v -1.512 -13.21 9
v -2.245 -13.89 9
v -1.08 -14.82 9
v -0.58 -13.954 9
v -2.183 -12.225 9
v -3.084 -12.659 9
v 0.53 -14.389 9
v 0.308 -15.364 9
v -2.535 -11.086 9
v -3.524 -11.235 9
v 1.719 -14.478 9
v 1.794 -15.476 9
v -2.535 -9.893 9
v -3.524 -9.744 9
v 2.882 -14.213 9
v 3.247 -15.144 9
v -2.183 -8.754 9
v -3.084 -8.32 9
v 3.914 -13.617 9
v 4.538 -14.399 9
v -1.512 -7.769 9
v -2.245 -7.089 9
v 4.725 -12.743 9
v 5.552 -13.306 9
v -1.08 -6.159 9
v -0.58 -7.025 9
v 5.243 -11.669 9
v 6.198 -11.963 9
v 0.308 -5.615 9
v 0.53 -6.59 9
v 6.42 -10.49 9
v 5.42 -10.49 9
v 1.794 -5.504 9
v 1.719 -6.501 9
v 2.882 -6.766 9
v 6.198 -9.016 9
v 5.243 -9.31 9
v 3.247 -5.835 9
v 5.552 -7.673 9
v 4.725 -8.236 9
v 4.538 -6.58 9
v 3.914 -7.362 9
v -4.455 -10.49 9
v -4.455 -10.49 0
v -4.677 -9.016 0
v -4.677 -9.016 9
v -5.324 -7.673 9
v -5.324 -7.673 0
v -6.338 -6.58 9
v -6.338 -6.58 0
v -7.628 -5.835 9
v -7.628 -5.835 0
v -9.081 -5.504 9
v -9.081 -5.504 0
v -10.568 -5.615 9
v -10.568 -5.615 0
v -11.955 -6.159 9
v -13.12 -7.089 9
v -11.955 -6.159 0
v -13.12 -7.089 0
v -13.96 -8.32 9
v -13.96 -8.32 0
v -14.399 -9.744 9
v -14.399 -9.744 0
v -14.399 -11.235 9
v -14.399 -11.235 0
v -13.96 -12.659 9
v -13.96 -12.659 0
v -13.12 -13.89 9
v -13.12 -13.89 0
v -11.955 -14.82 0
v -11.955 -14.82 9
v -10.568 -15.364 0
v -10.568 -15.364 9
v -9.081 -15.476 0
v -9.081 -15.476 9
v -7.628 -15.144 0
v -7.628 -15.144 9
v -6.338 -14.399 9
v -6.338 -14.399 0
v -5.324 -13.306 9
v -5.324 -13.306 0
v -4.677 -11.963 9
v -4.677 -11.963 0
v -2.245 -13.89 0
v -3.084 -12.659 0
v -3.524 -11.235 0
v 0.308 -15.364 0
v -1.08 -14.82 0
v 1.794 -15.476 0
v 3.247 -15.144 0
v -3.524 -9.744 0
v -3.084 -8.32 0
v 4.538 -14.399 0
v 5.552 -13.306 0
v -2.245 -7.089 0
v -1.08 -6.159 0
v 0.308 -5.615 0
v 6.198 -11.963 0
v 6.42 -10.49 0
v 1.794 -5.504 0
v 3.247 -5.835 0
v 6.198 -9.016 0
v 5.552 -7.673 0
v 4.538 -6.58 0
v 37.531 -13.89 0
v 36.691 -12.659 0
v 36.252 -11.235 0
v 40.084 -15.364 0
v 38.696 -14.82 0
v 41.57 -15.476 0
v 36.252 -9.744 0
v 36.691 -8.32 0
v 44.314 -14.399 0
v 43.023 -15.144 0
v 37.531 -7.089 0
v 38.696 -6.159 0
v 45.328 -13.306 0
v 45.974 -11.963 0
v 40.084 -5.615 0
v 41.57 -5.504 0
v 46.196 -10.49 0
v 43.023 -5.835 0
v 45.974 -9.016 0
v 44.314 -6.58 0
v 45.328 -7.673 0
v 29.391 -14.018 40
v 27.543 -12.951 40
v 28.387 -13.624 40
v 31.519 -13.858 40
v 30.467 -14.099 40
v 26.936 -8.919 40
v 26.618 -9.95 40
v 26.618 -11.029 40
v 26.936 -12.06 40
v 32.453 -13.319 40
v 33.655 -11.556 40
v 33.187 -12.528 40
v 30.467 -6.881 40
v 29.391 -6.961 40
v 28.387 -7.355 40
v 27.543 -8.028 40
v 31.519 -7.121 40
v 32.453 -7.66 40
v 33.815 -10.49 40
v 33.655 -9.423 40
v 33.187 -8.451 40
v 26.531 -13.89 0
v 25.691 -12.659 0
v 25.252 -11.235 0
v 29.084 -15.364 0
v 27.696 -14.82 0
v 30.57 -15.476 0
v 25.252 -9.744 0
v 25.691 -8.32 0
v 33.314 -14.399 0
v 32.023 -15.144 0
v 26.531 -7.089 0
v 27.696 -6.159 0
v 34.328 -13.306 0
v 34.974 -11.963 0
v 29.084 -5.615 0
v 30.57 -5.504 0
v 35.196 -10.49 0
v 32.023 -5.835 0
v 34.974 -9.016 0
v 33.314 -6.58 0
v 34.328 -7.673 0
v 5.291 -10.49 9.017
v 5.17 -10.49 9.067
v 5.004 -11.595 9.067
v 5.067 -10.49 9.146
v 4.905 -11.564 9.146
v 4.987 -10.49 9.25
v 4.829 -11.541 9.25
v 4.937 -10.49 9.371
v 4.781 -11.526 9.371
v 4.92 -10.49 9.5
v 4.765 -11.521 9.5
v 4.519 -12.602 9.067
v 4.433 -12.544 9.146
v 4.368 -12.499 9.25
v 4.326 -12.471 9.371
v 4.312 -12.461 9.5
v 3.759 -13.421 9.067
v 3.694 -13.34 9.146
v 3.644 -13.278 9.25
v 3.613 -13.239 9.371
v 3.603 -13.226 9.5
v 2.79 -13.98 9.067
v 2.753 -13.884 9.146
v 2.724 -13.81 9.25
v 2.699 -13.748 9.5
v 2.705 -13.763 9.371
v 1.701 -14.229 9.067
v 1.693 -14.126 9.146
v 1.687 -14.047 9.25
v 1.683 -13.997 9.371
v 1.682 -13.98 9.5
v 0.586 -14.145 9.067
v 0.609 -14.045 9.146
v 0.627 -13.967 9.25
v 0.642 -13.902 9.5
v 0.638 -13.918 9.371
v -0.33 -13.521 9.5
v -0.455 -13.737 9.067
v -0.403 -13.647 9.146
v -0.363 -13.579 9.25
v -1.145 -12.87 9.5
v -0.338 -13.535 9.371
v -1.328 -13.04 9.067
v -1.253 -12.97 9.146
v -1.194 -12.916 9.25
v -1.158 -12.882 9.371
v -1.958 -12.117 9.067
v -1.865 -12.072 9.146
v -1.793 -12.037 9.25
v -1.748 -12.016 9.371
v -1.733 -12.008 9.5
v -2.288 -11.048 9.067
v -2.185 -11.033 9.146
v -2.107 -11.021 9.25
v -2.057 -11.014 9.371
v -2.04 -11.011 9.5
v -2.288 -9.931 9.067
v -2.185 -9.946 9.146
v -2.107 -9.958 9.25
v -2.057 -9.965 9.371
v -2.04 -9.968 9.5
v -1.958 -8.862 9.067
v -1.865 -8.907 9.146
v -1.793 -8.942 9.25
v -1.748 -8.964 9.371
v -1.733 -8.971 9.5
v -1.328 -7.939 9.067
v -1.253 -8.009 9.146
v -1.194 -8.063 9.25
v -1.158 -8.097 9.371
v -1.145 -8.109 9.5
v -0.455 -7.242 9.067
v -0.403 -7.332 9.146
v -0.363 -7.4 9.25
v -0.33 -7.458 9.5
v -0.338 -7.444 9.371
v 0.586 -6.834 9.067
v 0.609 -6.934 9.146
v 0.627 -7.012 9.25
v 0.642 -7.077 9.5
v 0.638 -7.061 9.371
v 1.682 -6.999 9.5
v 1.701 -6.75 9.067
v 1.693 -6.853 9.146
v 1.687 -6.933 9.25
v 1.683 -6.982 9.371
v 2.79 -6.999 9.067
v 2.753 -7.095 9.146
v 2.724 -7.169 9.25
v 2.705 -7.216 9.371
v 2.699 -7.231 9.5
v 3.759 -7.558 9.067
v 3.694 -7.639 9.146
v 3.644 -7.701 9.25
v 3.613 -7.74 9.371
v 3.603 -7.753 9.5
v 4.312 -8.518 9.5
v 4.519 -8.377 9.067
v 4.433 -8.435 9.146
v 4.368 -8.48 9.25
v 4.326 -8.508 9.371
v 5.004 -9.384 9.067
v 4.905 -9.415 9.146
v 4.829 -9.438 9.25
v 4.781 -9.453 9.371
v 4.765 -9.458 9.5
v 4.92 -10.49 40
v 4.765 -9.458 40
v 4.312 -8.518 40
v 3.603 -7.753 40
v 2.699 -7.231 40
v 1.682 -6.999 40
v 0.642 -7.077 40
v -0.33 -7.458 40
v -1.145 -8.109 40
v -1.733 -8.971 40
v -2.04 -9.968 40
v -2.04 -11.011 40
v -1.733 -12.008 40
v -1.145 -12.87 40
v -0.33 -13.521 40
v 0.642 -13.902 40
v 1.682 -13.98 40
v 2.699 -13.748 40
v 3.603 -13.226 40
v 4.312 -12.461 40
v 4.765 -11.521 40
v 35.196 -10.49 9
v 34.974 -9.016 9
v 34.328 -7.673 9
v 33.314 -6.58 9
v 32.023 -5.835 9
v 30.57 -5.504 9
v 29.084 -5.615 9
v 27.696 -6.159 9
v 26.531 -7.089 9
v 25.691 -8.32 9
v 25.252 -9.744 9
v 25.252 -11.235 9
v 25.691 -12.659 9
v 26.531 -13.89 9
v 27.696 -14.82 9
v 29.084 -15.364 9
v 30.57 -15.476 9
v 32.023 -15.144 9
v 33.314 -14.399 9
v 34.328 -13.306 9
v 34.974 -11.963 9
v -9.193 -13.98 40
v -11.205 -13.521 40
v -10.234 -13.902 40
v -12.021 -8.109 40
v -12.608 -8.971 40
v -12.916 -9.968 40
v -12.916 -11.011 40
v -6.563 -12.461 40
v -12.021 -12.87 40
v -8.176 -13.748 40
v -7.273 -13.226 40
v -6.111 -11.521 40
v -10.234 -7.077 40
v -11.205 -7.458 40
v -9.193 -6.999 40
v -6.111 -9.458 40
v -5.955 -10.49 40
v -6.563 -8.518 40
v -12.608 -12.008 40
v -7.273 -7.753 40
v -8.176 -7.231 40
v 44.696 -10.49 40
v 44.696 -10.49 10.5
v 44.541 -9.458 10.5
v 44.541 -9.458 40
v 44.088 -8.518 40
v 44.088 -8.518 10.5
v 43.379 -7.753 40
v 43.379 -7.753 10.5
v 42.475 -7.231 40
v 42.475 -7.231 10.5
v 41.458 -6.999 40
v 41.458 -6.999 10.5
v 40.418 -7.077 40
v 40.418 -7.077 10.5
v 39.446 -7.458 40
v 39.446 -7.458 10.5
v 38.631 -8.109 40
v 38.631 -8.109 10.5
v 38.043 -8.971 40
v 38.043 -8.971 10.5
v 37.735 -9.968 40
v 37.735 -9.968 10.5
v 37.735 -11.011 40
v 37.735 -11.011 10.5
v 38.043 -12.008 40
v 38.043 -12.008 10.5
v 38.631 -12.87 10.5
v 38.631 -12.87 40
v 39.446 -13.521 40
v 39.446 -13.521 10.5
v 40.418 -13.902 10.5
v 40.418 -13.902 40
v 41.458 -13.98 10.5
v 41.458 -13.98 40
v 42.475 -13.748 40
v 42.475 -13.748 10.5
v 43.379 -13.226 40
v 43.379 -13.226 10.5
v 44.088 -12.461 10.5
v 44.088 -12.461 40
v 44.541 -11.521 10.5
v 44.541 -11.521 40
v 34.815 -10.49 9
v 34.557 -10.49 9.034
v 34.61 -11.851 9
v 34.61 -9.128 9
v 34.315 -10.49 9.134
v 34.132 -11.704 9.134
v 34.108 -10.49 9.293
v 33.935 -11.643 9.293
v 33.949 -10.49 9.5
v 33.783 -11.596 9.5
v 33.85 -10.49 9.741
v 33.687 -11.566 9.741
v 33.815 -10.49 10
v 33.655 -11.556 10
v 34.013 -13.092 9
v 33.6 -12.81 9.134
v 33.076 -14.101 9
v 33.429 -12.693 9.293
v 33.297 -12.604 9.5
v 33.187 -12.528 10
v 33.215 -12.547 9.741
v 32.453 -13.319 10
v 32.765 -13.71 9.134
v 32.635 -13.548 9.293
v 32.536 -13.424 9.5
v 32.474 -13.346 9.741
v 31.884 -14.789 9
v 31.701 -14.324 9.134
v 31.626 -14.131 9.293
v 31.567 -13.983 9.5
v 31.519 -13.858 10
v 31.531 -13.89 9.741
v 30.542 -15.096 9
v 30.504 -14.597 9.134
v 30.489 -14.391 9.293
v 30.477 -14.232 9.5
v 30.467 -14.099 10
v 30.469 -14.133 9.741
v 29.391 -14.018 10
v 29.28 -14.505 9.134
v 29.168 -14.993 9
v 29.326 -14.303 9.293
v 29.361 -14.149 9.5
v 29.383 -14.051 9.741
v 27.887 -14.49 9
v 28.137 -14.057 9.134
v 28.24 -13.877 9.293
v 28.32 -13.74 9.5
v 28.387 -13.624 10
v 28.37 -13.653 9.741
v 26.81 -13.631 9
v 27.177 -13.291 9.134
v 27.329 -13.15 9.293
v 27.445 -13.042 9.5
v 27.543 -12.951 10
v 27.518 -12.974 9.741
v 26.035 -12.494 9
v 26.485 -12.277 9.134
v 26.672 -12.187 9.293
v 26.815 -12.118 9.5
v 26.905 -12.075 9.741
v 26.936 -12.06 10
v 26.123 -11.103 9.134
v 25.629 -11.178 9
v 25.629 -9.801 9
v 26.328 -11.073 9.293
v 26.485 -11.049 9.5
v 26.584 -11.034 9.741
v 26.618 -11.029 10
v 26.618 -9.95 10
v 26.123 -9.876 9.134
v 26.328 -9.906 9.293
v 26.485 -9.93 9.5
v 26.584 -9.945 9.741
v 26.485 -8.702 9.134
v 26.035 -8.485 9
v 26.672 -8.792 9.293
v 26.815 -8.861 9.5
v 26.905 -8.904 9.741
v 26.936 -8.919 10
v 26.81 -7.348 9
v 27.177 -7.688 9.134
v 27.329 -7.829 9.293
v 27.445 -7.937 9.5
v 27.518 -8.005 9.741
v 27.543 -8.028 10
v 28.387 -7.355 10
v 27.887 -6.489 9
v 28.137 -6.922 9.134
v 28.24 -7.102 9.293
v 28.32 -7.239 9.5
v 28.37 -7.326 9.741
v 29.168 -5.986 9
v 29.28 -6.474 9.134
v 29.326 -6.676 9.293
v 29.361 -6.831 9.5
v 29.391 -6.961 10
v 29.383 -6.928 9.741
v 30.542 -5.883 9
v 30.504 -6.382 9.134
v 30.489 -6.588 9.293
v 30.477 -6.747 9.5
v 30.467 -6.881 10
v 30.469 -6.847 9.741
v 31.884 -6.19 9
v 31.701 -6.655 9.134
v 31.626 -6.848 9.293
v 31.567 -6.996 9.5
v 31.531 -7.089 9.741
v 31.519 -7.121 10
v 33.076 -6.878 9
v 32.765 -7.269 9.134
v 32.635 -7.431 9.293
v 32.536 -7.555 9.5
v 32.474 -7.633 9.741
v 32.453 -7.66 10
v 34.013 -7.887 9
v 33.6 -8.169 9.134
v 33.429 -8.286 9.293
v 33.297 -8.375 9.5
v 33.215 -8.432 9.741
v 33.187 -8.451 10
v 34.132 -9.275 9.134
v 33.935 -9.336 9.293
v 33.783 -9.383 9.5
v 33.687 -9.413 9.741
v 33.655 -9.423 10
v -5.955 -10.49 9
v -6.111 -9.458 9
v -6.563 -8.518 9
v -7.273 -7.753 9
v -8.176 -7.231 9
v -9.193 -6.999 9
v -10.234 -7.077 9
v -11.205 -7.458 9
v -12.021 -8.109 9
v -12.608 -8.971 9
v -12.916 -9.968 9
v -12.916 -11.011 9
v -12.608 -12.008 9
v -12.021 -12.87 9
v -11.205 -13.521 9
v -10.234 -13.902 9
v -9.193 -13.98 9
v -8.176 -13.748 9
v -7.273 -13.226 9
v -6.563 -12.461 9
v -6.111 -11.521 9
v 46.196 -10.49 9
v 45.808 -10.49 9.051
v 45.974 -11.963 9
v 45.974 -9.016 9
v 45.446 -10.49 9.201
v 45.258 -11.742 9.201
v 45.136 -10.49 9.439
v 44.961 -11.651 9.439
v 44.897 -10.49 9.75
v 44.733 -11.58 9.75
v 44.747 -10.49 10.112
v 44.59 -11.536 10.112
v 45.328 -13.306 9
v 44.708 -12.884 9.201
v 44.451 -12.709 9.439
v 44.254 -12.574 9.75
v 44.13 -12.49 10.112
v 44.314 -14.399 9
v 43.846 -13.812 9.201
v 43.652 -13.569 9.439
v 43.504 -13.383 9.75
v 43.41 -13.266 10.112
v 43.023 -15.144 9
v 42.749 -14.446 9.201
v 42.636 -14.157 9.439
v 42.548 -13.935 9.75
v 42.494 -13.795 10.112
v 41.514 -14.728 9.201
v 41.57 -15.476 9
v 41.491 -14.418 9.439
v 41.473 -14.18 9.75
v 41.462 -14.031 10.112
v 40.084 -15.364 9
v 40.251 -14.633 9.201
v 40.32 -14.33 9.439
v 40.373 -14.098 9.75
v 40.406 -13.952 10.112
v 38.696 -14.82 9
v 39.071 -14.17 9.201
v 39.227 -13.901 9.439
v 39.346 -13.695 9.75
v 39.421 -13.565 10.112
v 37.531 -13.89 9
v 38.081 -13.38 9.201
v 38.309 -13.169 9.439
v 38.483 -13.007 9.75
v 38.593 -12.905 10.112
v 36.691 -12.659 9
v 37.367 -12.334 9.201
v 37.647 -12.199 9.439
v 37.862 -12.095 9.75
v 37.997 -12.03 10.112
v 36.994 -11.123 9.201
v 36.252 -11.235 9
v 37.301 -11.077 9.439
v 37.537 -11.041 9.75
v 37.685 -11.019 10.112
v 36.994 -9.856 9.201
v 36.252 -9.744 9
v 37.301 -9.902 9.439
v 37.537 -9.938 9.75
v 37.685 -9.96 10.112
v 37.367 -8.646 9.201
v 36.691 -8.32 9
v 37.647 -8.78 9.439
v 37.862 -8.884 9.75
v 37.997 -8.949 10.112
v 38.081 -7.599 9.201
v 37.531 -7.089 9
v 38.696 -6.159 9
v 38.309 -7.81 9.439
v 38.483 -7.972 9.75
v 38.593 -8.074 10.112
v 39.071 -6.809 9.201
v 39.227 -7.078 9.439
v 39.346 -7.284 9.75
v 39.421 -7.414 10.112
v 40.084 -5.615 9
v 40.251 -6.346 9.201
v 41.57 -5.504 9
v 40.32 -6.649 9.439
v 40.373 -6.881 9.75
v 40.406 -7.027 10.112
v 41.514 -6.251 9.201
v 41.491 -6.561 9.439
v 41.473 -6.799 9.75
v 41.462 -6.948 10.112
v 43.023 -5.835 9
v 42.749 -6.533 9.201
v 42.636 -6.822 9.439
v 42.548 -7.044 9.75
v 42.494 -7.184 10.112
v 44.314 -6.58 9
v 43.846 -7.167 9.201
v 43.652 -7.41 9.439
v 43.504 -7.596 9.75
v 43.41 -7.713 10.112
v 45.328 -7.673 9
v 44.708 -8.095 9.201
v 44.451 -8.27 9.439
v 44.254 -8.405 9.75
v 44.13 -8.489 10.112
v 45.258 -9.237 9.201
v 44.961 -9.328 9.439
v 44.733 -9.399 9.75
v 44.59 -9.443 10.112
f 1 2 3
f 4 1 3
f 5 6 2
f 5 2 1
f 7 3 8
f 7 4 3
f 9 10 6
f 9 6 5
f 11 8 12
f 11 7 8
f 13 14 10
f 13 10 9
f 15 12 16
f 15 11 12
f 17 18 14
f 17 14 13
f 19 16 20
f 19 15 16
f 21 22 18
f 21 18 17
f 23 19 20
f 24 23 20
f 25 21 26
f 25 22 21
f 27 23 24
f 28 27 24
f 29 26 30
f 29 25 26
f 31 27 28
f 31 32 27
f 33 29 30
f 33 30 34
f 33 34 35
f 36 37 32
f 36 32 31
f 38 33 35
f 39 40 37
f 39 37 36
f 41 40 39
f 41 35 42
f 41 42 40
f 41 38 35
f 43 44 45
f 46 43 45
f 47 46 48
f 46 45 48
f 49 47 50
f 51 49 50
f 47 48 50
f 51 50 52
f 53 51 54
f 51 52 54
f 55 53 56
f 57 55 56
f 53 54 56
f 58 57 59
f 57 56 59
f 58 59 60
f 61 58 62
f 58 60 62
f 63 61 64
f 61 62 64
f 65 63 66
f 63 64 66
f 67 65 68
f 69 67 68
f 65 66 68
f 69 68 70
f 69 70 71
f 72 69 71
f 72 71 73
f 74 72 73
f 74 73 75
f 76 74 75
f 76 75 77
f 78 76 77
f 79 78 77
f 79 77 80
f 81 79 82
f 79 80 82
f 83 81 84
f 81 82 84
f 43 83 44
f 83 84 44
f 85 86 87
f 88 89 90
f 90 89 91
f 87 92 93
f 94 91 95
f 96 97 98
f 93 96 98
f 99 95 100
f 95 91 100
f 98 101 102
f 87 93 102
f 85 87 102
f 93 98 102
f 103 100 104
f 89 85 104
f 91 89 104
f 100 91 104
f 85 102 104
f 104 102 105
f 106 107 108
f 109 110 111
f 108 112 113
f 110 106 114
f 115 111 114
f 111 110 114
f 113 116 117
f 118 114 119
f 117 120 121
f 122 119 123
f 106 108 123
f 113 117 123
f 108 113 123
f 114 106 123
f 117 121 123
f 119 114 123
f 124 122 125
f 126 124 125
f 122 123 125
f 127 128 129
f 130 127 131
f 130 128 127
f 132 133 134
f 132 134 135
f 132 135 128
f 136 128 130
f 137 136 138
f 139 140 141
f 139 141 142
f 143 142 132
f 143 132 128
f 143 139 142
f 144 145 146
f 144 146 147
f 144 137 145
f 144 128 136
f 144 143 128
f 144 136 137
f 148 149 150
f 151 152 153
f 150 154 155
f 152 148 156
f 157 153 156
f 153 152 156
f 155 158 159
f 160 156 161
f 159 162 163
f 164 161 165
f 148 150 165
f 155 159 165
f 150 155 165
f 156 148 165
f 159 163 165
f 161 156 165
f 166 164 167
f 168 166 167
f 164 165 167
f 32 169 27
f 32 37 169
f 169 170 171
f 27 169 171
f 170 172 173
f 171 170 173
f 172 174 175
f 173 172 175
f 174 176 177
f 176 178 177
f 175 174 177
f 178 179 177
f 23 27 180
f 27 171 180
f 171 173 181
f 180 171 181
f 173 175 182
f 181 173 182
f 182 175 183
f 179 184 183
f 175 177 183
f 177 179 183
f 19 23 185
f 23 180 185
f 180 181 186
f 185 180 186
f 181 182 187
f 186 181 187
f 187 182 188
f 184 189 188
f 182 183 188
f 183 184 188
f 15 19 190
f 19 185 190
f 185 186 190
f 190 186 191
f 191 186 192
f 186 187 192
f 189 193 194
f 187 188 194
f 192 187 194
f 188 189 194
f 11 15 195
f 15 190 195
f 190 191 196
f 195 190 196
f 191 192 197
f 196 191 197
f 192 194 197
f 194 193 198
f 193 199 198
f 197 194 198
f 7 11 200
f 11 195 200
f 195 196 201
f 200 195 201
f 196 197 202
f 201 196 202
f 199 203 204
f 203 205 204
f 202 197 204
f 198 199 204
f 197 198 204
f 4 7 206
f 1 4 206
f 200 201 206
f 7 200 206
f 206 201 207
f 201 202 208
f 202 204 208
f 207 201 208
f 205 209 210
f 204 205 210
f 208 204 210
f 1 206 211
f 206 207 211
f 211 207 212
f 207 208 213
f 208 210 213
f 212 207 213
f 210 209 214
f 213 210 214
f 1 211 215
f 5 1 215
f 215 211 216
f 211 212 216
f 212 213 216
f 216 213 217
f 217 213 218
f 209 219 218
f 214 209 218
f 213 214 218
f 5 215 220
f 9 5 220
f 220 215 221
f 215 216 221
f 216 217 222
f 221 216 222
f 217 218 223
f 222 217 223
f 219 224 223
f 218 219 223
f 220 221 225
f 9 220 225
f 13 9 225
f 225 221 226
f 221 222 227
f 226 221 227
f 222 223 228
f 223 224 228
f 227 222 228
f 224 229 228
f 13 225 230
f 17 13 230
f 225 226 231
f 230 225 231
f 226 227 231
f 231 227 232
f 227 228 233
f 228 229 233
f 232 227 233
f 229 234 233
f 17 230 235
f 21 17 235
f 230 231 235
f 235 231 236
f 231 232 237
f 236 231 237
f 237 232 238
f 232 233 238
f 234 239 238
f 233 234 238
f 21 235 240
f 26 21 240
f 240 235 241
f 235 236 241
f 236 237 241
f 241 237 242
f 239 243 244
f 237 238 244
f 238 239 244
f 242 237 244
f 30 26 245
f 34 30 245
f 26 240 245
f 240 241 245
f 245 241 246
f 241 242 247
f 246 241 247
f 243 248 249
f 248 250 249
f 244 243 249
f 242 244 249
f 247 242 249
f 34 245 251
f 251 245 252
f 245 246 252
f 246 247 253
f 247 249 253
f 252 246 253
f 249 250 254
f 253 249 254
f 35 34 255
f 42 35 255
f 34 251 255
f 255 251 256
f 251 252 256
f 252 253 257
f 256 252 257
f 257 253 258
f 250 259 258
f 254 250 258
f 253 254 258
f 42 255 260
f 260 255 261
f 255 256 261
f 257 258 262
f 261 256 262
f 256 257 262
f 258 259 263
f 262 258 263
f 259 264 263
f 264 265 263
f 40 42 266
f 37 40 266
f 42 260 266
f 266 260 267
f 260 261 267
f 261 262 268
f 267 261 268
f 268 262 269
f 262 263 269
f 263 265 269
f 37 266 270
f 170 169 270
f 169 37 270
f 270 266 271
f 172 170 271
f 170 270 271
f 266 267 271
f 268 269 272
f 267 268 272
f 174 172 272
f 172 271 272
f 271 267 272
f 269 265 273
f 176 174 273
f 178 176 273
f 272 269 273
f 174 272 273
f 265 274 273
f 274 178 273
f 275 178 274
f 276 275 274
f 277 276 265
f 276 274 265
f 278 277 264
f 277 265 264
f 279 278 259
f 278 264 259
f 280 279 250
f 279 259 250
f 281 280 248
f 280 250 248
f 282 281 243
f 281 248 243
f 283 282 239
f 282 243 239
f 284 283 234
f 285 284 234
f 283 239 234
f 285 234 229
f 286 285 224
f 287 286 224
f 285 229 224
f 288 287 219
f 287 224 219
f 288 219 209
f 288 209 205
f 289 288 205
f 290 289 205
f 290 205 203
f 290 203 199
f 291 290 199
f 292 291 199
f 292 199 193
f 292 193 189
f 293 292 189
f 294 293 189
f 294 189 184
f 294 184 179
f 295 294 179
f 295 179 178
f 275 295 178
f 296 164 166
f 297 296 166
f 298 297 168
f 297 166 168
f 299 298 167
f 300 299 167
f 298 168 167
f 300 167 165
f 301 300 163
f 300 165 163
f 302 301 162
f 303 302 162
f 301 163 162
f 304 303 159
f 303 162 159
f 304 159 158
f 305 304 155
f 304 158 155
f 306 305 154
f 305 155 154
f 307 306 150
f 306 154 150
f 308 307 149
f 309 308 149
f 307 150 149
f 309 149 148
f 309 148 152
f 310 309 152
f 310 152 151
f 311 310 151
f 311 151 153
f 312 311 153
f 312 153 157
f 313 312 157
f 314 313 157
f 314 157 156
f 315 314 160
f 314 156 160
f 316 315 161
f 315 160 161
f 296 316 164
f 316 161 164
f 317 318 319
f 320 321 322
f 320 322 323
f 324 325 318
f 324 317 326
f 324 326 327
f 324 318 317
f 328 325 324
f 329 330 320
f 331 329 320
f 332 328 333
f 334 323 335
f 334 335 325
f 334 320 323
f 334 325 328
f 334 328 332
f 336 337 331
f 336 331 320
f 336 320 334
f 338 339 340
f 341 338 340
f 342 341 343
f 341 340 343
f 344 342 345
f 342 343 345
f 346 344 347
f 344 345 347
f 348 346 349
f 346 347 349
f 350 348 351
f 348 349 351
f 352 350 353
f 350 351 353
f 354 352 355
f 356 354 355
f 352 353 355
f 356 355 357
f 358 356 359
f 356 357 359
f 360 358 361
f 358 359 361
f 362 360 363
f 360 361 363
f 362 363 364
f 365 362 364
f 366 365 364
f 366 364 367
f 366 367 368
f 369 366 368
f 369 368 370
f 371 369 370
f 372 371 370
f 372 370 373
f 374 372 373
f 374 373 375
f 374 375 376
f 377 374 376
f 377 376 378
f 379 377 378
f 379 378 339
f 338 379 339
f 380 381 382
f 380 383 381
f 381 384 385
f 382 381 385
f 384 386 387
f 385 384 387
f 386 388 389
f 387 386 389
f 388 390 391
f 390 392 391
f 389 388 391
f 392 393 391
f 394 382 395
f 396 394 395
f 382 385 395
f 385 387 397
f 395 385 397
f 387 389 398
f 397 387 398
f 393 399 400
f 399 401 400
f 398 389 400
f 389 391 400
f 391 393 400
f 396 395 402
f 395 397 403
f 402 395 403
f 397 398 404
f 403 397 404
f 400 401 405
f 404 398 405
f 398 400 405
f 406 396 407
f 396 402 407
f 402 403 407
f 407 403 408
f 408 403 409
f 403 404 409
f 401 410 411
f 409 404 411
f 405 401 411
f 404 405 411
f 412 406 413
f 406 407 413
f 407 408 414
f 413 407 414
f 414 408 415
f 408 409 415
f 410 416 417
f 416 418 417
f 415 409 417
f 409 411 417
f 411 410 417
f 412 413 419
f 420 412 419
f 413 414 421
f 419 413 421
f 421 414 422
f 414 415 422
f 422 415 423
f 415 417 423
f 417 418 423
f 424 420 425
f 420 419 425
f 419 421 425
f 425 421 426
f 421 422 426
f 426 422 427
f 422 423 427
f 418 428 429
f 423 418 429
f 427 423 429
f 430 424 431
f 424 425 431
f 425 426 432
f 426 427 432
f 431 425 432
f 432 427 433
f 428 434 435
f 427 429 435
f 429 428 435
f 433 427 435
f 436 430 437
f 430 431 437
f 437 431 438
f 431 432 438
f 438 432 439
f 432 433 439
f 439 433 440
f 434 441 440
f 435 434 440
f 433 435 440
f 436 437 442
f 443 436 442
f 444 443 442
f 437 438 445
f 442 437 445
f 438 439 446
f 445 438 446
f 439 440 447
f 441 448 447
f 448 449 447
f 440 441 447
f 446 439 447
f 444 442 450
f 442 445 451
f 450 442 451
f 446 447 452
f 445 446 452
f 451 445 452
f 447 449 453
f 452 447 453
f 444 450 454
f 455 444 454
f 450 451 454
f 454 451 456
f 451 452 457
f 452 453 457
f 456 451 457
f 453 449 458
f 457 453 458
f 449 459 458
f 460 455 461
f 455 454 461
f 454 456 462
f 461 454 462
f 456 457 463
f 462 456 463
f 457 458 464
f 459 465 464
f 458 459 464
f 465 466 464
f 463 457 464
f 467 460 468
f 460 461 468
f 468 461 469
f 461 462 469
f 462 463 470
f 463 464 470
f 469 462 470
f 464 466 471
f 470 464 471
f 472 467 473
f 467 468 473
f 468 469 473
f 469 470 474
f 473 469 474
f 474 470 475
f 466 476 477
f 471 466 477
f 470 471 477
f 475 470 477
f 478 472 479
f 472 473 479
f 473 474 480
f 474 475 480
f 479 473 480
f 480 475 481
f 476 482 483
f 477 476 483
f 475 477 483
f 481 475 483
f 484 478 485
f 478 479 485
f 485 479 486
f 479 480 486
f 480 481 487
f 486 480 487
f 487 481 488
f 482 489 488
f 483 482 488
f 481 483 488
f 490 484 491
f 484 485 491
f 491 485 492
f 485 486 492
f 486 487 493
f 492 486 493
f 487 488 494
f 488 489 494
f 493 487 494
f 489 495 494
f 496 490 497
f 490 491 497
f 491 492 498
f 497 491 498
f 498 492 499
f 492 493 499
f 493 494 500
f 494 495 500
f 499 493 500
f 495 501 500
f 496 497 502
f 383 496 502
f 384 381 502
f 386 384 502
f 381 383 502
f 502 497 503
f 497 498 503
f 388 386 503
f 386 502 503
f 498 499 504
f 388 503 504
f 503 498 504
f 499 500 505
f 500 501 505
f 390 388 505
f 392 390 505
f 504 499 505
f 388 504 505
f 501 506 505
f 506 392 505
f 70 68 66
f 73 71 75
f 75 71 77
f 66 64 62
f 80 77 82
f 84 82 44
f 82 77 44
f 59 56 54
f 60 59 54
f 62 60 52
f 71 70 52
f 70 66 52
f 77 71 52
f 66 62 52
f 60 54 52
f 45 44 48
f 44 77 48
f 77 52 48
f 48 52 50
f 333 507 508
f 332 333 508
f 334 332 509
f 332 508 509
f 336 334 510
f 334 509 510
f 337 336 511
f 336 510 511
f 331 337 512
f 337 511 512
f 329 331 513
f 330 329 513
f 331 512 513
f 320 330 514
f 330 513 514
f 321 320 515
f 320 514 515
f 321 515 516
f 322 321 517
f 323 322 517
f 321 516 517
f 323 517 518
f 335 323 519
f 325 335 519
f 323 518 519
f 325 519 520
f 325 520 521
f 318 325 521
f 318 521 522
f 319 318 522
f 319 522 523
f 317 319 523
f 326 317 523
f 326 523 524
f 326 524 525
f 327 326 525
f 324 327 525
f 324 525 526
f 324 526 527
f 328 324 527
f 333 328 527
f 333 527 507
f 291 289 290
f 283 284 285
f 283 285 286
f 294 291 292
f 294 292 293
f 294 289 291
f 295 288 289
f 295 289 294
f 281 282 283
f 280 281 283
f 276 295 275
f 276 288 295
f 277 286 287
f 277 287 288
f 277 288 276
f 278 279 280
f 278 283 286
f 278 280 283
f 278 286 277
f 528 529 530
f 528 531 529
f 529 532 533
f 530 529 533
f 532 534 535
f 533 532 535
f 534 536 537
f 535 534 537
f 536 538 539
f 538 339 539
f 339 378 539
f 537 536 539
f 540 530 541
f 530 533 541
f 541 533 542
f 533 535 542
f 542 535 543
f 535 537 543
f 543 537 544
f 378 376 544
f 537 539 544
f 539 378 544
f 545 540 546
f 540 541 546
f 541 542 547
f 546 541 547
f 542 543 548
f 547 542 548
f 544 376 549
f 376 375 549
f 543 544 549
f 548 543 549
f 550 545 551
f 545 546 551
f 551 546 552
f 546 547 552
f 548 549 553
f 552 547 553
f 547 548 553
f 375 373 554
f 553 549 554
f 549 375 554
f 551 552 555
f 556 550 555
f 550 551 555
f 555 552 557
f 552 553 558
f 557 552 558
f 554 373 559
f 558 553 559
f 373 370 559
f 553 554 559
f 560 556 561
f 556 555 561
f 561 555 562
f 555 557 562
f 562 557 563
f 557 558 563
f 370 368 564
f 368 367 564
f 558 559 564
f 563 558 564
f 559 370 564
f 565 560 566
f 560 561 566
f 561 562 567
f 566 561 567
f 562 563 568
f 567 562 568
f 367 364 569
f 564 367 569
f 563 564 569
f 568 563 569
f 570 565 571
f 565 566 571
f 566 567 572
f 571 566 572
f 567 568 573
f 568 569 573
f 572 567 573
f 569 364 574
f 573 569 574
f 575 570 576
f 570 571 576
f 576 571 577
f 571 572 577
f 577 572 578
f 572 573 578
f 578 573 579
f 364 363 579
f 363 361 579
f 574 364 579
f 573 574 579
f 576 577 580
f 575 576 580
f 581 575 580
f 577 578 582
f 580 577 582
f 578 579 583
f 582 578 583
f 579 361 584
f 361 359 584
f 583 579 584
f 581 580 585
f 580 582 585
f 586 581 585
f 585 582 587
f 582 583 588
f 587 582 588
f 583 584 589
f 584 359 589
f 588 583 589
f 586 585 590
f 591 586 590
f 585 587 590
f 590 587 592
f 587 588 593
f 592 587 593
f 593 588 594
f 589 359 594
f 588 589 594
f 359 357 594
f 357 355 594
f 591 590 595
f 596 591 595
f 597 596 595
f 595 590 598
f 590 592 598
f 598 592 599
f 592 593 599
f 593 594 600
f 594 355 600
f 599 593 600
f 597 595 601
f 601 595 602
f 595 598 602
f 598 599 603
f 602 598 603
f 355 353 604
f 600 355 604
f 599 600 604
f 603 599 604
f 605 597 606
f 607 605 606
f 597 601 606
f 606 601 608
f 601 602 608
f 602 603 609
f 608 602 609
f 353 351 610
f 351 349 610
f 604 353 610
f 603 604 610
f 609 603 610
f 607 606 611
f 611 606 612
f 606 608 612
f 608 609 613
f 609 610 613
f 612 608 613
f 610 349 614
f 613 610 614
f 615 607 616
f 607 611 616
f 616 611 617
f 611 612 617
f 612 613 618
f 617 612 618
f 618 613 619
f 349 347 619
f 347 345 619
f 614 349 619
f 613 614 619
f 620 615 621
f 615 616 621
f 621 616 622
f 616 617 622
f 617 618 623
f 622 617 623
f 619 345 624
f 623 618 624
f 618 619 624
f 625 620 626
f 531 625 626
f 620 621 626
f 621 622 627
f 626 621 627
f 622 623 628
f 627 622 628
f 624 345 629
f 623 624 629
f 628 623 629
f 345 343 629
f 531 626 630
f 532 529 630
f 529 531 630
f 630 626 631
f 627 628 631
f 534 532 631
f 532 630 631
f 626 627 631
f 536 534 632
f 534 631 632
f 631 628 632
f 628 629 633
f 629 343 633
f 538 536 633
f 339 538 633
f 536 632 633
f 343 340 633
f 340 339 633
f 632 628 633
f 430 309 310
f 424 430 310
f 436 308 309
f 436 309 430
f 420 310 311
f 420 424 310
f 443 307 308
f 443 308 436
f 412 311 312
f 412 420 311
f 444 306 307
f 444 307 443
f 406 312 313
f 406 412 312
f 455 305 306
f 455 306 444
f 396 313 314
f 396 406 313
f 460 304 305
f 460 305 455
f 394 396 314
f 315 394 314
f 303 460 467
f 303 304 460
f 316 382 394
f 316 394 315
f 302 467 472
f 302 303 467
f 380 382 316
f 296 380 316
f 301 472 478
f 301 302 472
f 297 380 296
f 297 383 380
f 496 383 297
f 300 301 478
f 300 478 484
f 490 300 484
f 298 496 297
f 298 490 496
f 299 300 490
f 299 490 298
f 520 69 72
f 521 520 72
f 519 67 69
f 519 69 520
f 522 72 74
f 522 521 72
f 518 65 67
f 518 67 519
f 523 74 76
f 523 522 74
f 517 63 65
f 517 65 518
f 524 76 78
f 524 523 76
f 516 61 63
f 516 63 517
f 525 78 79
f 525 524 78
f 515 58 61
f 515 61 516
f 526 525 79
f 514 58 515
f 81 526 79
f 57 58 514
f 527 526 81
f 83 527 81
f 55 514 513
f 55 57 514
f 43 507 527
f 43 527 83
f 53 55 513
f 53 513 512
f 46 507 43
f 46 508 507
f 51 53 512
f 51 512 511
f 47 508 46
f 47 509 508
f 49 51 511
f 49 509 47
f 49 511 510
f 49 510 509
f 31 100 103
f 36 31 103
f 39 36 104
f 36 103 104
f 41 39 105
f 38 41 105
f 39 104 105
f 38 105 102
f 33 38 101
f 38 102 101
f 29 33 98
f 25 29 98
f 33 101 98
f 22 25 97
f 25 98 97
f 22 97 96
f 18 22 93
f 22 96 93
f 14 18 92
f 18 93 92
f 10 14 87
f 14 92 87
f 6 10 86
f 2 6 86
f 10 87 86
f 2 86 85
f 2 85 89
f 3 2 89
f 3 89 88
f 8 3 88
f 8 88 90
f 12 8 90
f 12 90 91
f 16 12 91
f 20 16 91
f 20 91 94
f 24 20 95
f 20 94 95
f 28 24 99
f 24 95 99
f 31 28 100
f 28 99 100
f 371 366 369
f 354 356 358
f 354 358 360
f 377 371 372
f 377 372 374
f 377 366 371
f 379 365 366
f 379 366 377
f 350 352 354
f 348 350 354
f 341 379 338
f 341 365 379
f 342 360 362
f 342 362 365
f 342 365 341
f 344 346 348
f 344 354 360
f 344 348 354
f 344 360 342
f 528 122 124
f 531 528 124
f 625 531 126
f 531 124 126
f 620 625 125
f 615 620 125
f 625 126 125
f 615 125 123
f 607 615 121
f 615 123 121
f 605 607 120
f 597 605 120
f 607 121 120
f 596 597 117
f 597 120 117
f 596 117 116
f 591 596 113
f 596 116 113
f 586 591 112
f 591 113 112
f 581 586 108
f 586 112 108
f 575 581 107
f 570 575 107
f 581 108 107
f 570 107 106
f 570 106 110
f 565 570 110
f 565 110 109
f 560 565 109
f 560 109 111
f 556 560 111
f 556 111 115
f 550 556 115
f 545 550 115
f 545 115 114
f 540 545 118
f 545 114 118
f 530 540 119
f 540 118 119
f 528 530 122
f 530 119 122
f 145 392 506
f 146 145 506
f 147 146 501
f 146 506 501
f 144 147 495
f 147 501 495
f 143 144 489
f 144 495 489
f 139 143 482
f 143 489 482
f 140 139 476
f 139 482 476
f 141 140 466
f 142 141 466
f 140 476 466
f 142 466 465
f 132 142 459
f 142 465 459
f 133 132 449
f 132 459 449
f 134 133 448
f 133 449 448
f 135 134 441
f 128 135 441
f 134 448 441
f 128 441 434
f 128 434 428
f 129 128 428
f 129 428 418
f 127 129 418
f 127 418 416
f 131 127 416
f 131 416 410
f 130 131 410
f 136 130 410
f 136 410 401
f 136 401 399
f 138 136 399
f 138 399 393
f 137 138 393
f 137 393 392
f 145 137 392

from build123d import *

# Parameters (mm, degrees)
F0_R     = 3.5
F1_DEPTH = 40
F0_R_2   = 3.6191233998
F2_R     = 5
F3_DEPTH = 9
F4_R     = 0.5
F5_R     = 1
F6_R     = 1.49999


# Not quite as in the source:
# - a fillet or chamfer is up to 0.001 mm smaller than in the source, because OpenCascade refuses the exact size


with BuildPart() as f1:
    # F0 (on Top) → F1 (new body)
    with BuildSketch(Plane.XY):
        with Locations((-9.4550363719, -10.4895196855)):
            Circle(F0_R)
    extrude(amount=F1_DEPTH)

    # F2 (on Top) → F3 (join)
    with BuildSketch(Plane.XY):
        with Locations((-9.4550363719, -10.4895196855)):
            Circle(F2_R)
    extrude(amount=F3_DEPTH)


with BuildPart() as f1b:
    # F0 (on Top) → F1, piece 2 (new body)
    with BuildSketch(Plane.XY):
        with Locations((1.4204620384, -10.4895196855)):
            Circle(F0_R)
    extrude(amount=F1_DEPTH)

    # F2 (on Top) → F3, piece 2 (join)
    with BuildSketch(Plane.XY):
        with Locations((1.4204620384, -10.4895196855)):
            Circle(F2_R)
    extrude(amount=F3_DEPTH)

    # F4
    f4_edges = [f1b.edges().sort_by_distance(p)[0] for p in [
        (-2.079538, -10.48952, 9),
    ]]
    fillet(f4_edges, radius=F4_R)


with BuildPart() as f1c:
    # F0 (on Top) → F1, piece 3 (new body)
    with BuildSketch(Plane.XY):
        with Locations((30.196333304, -10.4895196855)):
            Circle(F0_R_2)
    extrude(amount=F1_DEPTH)

    # F2 (on Top) → F3, piece 3 (join)
    with BuildSketch(Plane.XY):
        with Locations((30.196333304, -10.4895196855)):
            Circle(F2_R)
    extrude(amount=F3_DEPTH)

    # F5
    f5_edges = [f1c.edges().sort_by_distance(p)[0] for p in [
        (26.57721, -10.48952, 9),
    ]]
    fillet(f5_edges, radius=F5_R)


with BuildPart() as f1d:
    # F0 (on Top) → F1, piece 4 (new body)
    with BuildSketch(Plane.XY):
        with Locations((41.196333304, -10.4895196855)):
            Circle(F0_R)
    extrude(amount=F1_DEPTH)

    # F2 (on Top) → F3, piece 4 (join)
    with BuildSketch(Plane.XY):
        with Locations((41.196333304, -10.4895196855)):
            Circle(F2_R)
    extrude(amount=F3_DEPTH)

    # F6 (radius 1.5 in the source; OpenCascade refuses exactly that, so slightly less here)
    f6_edges = [f1d.edges().sort_by_distance(p)[0] for p in [
        (37.696333, -10.48952, 9),
    ]]
    fillet(f6_edges, radius=F6_R)


solid = Compound([f1.part, f1b.part, f1c.part, f1d.part])
